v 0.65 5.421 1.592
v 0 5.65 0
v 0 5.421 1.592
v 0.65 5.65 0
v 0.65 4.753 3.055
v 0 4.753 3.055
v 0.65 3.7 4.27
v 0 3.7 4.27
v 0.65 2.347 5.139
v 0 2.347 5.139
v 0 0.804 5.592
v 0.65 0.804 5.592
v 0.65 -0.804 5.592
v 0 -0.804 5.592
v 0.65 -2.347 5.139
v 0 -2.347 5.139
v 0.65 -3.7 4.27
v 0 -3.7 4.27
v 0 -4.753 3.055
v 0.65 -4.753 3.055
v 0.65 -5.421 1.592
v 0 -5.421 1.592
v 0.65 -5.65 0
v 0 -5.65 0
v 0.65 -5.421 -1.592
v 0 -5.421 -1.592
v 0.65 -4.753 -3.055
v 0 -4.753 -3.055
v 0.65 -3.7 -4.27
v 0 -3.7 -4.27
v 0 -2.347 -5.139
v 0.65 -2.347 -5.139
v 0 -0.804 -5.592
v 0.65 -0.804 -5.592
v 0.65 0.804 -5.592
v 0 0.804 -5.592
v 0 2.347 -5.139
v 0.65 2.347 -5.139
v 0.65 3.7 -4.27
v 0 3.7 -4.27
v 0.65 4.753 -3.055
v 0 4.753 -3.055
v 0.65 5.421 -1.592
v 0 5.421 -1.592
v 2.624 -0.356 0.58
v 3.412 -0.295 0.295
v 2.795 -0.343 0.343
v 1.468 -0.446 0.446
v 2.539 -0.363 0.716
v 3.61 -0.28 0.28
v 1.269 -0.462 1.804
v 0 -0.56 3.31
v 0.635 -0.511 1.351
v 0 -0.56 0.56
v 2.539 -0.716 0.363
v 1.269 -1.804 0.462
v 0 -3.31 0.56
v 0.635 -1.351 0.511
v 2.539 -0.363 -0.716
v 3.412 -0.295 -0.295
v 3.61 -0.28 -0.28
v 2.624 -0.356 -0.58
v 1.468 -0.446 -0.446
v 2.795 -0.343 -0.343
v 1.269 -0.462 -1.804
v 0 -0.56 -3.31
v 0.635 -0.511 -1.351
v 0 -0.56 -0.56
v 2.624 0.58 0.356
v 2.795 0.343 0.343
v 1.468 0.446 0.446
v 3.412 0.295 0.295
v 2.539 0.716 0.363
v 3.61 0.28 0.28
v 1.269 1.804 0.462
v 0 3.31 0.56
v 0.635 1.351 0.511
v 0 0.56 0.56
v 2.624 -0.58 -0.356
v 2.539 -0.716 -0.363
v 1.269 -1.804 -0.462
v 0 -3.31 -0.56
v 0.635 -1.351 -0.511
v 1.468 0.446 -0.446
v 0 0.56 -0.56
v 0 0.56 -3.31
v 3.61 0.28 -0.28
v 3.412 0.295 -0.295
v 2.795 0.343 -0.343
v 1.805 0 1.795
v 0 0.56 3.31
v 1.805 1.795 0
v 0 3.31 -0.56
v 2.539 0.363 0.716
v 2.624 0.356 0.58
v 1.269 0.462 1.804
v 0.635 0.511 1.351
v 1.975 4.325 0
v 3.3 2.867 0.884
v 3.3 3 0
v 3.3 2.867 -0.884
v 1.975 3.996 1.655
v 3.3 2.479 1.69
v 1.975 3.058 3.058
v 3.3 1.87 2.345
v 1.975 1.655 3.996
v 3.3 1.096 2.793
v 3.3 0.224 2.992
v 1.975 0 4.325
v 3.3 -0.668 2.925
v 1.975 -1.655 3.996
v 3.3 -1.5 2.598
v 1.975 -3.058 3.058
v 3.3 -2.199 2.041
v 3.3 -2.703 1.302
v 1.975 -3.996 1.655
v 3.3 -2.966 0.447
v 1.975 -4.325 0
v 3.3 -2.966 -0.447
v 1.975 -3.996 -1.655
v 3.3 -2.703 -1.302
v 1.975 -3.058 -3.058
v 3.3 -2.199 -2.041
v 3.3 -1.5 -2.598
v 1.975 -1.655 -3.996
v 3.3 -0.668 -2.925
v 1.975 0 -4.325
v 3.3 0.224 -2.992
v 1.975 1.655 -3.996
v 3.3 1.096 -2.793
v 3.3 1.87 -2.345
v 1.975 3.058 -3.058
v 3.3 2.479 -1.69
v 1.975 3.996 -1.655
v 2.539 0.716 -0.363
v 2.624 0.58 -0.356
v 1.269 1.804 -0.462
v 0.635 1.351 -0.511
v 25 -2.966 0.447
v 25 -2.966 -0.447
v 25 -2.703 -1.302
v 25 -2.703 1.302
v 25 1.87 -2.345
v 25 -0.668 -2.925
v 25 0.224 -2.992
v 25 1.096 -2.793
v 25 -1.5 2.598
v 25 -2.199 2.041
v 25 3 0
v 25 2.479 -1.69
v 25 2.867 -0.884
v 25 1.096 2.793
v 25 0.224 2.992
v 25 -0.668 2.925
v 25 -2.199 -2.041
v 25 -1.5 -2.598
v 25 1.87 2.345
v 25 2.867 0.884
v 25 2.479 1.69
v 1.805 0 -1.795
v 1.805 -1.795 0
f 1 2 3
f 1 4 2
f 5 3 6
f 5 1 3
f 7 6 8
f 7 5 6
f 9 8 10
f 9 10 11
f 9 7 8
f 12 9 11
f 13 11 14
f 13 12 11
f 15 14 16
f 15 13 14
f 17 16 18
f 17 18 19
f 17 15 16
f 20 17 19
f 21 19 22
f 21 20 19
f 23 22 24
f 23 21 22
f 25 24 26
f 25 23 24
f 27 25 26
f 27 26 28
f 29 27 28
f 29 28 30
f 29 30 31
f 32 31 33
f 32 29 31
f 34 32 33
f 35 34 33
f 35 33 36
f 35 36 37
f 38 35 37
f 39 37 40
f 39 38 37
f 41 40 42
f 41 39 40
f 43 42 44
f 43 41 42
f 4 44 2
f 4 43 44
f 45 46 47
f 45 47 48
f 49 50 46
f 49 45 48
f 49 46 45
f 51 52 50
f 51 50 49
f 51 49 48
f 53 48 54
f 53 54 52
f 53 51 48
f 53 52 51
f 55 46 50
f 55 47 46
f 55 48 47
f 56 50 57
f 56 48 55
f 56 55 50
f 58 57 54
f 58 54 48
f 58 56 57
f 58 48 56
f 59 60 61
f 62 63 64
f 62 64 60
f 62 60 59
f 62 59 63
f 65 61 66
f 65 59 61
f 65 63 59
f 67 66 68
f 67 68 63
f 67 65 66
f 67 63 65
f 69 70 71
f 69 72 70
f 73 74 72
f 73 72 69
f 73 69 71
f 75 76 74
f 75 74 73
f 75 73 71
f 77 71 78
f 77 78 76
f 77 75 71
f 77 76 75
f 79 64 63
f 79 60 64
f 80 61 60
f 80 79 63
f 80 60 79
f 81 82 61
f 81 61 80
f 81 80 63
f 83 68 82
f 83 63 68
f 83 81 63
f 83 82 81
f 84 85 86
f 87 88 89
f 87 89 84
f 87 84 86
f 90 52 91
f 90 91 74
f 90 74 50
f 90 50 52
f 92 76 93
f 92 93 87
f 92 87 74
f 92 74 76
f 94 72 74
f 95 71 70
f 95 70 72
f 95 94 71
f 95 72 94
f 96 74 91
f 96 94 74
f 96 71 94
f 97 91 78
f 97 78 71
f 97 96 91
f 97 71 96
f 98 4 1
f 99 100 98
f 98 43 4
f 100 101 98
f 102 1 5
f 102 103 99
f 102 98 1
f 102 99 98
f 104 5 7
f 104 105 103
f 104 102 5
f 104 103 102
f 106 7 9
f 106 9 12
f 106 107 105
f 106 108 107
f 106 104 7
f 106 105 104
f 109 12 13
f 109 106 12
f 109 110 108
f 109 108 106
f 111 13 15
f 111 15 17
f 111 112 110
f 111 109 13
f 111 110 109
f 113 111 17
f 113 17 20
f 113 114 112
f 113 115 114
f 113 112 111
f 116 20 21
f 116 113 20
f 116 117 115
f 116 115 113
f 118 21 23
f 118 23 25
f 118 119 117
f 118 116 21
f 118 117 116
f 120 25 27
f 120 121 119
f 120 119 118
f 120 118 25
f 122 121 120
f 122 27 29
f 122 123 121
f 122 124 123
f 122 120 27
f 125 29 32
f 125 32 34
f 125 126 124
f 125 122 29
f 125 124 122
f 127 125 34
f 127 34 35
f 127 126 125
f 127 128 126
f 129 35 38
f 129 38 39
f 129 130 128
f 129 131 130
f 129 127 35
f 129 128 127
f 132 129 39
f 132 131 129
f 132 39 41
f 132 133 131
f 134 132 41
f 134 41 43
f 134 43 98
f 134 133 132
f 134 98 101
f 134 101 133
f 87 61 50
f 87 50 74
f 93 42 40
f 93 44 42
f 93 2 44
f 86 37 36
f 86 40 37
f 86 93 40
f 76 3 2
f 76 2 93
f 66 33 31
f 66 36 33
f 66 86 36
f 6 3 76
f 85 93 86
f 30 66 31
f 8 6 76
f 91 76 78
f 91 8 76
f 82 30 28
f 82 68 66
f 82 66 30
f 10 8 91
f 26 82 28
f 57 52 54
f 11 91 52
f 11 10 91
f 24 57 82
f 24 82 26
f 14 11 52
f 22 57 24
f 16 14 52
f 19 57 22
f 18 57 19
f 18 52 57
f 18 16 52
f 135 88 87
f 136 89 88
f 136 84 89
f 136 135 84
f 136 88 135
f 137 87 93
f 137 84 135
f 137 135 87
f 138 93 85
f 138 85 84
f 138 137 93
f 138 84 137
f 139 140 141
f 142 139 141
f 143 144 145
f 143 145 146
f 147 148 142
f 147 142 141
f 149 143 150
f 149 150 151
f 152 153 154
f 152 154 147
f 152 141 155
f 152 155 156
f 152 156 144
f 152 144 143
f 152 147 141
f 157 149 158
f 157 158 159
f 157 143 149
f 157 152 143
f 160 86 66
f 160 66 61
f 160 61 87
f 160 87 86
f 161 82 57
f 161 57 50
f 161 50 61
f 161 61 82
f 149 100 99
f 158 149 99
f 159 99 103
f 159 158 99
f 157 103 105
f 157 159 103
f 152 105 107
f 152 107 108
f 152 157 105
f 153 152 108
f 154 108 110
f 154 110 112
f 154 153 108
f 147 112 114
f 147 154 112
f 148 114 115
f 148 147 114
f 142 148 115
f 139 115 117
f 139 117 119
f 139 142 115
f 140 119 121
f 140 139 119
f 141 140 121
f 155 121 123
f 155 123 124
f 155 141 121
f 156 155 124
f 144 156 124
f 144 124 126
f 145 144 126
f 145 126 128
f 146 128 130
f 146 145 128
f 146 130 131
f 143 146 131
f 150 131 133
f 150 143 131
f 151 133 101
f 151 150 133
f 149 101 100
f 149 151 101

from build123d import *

# Parameters (mm, degrees)
SKETCH3_W         = 1.12
SKETCH3_H         = 6.62
SKETCH4_W         = 0.56
SKETCH4_H         = 0.56
CIRPATTERN1_COUNT = 2
CIRPATTERN1_ANGLE = 90


with BuildPart() as part:
    # BodySke → Base-Revolve (revolve)
    with BuildSketch(Plane.XY):
        Polygon((0, 0), (0, 5.65), (0.65, 5.65), (3.3, 3), (25, 3), (25, 0), align=None)
    revolve(axis=Axis((-6.35, 0, 0), (1, 0, 0)))

    # Sketch3 → Cross section 0
    with BuildSketch(Plane.ZY):
        Rectangle(SKETCH3_W, SKETCH3_H)
    # Sketch4 → Cross section 1
    with BuildSketch(Plane.ZY.offset(-3.61)):
        Rectangle(SKETCH4_W, SKETCH4_H)
    cross = loft(mode=Mode.SUBTRACT)

    # CirPattern1: Cross ×2 about axis
    cirpattern1_axis = Axis((0, 0, 0), (1, 0, 0))
    for i in range(1, CIRPATTERN1_COUNT):
        add(cross.rotate(cirpattern1_axis, i * CIRPATTERN1_ANGLE / (CIRPATTERN1_COUNT - 1)), mode=Mode.SUBTRACT)


solid = part.part
